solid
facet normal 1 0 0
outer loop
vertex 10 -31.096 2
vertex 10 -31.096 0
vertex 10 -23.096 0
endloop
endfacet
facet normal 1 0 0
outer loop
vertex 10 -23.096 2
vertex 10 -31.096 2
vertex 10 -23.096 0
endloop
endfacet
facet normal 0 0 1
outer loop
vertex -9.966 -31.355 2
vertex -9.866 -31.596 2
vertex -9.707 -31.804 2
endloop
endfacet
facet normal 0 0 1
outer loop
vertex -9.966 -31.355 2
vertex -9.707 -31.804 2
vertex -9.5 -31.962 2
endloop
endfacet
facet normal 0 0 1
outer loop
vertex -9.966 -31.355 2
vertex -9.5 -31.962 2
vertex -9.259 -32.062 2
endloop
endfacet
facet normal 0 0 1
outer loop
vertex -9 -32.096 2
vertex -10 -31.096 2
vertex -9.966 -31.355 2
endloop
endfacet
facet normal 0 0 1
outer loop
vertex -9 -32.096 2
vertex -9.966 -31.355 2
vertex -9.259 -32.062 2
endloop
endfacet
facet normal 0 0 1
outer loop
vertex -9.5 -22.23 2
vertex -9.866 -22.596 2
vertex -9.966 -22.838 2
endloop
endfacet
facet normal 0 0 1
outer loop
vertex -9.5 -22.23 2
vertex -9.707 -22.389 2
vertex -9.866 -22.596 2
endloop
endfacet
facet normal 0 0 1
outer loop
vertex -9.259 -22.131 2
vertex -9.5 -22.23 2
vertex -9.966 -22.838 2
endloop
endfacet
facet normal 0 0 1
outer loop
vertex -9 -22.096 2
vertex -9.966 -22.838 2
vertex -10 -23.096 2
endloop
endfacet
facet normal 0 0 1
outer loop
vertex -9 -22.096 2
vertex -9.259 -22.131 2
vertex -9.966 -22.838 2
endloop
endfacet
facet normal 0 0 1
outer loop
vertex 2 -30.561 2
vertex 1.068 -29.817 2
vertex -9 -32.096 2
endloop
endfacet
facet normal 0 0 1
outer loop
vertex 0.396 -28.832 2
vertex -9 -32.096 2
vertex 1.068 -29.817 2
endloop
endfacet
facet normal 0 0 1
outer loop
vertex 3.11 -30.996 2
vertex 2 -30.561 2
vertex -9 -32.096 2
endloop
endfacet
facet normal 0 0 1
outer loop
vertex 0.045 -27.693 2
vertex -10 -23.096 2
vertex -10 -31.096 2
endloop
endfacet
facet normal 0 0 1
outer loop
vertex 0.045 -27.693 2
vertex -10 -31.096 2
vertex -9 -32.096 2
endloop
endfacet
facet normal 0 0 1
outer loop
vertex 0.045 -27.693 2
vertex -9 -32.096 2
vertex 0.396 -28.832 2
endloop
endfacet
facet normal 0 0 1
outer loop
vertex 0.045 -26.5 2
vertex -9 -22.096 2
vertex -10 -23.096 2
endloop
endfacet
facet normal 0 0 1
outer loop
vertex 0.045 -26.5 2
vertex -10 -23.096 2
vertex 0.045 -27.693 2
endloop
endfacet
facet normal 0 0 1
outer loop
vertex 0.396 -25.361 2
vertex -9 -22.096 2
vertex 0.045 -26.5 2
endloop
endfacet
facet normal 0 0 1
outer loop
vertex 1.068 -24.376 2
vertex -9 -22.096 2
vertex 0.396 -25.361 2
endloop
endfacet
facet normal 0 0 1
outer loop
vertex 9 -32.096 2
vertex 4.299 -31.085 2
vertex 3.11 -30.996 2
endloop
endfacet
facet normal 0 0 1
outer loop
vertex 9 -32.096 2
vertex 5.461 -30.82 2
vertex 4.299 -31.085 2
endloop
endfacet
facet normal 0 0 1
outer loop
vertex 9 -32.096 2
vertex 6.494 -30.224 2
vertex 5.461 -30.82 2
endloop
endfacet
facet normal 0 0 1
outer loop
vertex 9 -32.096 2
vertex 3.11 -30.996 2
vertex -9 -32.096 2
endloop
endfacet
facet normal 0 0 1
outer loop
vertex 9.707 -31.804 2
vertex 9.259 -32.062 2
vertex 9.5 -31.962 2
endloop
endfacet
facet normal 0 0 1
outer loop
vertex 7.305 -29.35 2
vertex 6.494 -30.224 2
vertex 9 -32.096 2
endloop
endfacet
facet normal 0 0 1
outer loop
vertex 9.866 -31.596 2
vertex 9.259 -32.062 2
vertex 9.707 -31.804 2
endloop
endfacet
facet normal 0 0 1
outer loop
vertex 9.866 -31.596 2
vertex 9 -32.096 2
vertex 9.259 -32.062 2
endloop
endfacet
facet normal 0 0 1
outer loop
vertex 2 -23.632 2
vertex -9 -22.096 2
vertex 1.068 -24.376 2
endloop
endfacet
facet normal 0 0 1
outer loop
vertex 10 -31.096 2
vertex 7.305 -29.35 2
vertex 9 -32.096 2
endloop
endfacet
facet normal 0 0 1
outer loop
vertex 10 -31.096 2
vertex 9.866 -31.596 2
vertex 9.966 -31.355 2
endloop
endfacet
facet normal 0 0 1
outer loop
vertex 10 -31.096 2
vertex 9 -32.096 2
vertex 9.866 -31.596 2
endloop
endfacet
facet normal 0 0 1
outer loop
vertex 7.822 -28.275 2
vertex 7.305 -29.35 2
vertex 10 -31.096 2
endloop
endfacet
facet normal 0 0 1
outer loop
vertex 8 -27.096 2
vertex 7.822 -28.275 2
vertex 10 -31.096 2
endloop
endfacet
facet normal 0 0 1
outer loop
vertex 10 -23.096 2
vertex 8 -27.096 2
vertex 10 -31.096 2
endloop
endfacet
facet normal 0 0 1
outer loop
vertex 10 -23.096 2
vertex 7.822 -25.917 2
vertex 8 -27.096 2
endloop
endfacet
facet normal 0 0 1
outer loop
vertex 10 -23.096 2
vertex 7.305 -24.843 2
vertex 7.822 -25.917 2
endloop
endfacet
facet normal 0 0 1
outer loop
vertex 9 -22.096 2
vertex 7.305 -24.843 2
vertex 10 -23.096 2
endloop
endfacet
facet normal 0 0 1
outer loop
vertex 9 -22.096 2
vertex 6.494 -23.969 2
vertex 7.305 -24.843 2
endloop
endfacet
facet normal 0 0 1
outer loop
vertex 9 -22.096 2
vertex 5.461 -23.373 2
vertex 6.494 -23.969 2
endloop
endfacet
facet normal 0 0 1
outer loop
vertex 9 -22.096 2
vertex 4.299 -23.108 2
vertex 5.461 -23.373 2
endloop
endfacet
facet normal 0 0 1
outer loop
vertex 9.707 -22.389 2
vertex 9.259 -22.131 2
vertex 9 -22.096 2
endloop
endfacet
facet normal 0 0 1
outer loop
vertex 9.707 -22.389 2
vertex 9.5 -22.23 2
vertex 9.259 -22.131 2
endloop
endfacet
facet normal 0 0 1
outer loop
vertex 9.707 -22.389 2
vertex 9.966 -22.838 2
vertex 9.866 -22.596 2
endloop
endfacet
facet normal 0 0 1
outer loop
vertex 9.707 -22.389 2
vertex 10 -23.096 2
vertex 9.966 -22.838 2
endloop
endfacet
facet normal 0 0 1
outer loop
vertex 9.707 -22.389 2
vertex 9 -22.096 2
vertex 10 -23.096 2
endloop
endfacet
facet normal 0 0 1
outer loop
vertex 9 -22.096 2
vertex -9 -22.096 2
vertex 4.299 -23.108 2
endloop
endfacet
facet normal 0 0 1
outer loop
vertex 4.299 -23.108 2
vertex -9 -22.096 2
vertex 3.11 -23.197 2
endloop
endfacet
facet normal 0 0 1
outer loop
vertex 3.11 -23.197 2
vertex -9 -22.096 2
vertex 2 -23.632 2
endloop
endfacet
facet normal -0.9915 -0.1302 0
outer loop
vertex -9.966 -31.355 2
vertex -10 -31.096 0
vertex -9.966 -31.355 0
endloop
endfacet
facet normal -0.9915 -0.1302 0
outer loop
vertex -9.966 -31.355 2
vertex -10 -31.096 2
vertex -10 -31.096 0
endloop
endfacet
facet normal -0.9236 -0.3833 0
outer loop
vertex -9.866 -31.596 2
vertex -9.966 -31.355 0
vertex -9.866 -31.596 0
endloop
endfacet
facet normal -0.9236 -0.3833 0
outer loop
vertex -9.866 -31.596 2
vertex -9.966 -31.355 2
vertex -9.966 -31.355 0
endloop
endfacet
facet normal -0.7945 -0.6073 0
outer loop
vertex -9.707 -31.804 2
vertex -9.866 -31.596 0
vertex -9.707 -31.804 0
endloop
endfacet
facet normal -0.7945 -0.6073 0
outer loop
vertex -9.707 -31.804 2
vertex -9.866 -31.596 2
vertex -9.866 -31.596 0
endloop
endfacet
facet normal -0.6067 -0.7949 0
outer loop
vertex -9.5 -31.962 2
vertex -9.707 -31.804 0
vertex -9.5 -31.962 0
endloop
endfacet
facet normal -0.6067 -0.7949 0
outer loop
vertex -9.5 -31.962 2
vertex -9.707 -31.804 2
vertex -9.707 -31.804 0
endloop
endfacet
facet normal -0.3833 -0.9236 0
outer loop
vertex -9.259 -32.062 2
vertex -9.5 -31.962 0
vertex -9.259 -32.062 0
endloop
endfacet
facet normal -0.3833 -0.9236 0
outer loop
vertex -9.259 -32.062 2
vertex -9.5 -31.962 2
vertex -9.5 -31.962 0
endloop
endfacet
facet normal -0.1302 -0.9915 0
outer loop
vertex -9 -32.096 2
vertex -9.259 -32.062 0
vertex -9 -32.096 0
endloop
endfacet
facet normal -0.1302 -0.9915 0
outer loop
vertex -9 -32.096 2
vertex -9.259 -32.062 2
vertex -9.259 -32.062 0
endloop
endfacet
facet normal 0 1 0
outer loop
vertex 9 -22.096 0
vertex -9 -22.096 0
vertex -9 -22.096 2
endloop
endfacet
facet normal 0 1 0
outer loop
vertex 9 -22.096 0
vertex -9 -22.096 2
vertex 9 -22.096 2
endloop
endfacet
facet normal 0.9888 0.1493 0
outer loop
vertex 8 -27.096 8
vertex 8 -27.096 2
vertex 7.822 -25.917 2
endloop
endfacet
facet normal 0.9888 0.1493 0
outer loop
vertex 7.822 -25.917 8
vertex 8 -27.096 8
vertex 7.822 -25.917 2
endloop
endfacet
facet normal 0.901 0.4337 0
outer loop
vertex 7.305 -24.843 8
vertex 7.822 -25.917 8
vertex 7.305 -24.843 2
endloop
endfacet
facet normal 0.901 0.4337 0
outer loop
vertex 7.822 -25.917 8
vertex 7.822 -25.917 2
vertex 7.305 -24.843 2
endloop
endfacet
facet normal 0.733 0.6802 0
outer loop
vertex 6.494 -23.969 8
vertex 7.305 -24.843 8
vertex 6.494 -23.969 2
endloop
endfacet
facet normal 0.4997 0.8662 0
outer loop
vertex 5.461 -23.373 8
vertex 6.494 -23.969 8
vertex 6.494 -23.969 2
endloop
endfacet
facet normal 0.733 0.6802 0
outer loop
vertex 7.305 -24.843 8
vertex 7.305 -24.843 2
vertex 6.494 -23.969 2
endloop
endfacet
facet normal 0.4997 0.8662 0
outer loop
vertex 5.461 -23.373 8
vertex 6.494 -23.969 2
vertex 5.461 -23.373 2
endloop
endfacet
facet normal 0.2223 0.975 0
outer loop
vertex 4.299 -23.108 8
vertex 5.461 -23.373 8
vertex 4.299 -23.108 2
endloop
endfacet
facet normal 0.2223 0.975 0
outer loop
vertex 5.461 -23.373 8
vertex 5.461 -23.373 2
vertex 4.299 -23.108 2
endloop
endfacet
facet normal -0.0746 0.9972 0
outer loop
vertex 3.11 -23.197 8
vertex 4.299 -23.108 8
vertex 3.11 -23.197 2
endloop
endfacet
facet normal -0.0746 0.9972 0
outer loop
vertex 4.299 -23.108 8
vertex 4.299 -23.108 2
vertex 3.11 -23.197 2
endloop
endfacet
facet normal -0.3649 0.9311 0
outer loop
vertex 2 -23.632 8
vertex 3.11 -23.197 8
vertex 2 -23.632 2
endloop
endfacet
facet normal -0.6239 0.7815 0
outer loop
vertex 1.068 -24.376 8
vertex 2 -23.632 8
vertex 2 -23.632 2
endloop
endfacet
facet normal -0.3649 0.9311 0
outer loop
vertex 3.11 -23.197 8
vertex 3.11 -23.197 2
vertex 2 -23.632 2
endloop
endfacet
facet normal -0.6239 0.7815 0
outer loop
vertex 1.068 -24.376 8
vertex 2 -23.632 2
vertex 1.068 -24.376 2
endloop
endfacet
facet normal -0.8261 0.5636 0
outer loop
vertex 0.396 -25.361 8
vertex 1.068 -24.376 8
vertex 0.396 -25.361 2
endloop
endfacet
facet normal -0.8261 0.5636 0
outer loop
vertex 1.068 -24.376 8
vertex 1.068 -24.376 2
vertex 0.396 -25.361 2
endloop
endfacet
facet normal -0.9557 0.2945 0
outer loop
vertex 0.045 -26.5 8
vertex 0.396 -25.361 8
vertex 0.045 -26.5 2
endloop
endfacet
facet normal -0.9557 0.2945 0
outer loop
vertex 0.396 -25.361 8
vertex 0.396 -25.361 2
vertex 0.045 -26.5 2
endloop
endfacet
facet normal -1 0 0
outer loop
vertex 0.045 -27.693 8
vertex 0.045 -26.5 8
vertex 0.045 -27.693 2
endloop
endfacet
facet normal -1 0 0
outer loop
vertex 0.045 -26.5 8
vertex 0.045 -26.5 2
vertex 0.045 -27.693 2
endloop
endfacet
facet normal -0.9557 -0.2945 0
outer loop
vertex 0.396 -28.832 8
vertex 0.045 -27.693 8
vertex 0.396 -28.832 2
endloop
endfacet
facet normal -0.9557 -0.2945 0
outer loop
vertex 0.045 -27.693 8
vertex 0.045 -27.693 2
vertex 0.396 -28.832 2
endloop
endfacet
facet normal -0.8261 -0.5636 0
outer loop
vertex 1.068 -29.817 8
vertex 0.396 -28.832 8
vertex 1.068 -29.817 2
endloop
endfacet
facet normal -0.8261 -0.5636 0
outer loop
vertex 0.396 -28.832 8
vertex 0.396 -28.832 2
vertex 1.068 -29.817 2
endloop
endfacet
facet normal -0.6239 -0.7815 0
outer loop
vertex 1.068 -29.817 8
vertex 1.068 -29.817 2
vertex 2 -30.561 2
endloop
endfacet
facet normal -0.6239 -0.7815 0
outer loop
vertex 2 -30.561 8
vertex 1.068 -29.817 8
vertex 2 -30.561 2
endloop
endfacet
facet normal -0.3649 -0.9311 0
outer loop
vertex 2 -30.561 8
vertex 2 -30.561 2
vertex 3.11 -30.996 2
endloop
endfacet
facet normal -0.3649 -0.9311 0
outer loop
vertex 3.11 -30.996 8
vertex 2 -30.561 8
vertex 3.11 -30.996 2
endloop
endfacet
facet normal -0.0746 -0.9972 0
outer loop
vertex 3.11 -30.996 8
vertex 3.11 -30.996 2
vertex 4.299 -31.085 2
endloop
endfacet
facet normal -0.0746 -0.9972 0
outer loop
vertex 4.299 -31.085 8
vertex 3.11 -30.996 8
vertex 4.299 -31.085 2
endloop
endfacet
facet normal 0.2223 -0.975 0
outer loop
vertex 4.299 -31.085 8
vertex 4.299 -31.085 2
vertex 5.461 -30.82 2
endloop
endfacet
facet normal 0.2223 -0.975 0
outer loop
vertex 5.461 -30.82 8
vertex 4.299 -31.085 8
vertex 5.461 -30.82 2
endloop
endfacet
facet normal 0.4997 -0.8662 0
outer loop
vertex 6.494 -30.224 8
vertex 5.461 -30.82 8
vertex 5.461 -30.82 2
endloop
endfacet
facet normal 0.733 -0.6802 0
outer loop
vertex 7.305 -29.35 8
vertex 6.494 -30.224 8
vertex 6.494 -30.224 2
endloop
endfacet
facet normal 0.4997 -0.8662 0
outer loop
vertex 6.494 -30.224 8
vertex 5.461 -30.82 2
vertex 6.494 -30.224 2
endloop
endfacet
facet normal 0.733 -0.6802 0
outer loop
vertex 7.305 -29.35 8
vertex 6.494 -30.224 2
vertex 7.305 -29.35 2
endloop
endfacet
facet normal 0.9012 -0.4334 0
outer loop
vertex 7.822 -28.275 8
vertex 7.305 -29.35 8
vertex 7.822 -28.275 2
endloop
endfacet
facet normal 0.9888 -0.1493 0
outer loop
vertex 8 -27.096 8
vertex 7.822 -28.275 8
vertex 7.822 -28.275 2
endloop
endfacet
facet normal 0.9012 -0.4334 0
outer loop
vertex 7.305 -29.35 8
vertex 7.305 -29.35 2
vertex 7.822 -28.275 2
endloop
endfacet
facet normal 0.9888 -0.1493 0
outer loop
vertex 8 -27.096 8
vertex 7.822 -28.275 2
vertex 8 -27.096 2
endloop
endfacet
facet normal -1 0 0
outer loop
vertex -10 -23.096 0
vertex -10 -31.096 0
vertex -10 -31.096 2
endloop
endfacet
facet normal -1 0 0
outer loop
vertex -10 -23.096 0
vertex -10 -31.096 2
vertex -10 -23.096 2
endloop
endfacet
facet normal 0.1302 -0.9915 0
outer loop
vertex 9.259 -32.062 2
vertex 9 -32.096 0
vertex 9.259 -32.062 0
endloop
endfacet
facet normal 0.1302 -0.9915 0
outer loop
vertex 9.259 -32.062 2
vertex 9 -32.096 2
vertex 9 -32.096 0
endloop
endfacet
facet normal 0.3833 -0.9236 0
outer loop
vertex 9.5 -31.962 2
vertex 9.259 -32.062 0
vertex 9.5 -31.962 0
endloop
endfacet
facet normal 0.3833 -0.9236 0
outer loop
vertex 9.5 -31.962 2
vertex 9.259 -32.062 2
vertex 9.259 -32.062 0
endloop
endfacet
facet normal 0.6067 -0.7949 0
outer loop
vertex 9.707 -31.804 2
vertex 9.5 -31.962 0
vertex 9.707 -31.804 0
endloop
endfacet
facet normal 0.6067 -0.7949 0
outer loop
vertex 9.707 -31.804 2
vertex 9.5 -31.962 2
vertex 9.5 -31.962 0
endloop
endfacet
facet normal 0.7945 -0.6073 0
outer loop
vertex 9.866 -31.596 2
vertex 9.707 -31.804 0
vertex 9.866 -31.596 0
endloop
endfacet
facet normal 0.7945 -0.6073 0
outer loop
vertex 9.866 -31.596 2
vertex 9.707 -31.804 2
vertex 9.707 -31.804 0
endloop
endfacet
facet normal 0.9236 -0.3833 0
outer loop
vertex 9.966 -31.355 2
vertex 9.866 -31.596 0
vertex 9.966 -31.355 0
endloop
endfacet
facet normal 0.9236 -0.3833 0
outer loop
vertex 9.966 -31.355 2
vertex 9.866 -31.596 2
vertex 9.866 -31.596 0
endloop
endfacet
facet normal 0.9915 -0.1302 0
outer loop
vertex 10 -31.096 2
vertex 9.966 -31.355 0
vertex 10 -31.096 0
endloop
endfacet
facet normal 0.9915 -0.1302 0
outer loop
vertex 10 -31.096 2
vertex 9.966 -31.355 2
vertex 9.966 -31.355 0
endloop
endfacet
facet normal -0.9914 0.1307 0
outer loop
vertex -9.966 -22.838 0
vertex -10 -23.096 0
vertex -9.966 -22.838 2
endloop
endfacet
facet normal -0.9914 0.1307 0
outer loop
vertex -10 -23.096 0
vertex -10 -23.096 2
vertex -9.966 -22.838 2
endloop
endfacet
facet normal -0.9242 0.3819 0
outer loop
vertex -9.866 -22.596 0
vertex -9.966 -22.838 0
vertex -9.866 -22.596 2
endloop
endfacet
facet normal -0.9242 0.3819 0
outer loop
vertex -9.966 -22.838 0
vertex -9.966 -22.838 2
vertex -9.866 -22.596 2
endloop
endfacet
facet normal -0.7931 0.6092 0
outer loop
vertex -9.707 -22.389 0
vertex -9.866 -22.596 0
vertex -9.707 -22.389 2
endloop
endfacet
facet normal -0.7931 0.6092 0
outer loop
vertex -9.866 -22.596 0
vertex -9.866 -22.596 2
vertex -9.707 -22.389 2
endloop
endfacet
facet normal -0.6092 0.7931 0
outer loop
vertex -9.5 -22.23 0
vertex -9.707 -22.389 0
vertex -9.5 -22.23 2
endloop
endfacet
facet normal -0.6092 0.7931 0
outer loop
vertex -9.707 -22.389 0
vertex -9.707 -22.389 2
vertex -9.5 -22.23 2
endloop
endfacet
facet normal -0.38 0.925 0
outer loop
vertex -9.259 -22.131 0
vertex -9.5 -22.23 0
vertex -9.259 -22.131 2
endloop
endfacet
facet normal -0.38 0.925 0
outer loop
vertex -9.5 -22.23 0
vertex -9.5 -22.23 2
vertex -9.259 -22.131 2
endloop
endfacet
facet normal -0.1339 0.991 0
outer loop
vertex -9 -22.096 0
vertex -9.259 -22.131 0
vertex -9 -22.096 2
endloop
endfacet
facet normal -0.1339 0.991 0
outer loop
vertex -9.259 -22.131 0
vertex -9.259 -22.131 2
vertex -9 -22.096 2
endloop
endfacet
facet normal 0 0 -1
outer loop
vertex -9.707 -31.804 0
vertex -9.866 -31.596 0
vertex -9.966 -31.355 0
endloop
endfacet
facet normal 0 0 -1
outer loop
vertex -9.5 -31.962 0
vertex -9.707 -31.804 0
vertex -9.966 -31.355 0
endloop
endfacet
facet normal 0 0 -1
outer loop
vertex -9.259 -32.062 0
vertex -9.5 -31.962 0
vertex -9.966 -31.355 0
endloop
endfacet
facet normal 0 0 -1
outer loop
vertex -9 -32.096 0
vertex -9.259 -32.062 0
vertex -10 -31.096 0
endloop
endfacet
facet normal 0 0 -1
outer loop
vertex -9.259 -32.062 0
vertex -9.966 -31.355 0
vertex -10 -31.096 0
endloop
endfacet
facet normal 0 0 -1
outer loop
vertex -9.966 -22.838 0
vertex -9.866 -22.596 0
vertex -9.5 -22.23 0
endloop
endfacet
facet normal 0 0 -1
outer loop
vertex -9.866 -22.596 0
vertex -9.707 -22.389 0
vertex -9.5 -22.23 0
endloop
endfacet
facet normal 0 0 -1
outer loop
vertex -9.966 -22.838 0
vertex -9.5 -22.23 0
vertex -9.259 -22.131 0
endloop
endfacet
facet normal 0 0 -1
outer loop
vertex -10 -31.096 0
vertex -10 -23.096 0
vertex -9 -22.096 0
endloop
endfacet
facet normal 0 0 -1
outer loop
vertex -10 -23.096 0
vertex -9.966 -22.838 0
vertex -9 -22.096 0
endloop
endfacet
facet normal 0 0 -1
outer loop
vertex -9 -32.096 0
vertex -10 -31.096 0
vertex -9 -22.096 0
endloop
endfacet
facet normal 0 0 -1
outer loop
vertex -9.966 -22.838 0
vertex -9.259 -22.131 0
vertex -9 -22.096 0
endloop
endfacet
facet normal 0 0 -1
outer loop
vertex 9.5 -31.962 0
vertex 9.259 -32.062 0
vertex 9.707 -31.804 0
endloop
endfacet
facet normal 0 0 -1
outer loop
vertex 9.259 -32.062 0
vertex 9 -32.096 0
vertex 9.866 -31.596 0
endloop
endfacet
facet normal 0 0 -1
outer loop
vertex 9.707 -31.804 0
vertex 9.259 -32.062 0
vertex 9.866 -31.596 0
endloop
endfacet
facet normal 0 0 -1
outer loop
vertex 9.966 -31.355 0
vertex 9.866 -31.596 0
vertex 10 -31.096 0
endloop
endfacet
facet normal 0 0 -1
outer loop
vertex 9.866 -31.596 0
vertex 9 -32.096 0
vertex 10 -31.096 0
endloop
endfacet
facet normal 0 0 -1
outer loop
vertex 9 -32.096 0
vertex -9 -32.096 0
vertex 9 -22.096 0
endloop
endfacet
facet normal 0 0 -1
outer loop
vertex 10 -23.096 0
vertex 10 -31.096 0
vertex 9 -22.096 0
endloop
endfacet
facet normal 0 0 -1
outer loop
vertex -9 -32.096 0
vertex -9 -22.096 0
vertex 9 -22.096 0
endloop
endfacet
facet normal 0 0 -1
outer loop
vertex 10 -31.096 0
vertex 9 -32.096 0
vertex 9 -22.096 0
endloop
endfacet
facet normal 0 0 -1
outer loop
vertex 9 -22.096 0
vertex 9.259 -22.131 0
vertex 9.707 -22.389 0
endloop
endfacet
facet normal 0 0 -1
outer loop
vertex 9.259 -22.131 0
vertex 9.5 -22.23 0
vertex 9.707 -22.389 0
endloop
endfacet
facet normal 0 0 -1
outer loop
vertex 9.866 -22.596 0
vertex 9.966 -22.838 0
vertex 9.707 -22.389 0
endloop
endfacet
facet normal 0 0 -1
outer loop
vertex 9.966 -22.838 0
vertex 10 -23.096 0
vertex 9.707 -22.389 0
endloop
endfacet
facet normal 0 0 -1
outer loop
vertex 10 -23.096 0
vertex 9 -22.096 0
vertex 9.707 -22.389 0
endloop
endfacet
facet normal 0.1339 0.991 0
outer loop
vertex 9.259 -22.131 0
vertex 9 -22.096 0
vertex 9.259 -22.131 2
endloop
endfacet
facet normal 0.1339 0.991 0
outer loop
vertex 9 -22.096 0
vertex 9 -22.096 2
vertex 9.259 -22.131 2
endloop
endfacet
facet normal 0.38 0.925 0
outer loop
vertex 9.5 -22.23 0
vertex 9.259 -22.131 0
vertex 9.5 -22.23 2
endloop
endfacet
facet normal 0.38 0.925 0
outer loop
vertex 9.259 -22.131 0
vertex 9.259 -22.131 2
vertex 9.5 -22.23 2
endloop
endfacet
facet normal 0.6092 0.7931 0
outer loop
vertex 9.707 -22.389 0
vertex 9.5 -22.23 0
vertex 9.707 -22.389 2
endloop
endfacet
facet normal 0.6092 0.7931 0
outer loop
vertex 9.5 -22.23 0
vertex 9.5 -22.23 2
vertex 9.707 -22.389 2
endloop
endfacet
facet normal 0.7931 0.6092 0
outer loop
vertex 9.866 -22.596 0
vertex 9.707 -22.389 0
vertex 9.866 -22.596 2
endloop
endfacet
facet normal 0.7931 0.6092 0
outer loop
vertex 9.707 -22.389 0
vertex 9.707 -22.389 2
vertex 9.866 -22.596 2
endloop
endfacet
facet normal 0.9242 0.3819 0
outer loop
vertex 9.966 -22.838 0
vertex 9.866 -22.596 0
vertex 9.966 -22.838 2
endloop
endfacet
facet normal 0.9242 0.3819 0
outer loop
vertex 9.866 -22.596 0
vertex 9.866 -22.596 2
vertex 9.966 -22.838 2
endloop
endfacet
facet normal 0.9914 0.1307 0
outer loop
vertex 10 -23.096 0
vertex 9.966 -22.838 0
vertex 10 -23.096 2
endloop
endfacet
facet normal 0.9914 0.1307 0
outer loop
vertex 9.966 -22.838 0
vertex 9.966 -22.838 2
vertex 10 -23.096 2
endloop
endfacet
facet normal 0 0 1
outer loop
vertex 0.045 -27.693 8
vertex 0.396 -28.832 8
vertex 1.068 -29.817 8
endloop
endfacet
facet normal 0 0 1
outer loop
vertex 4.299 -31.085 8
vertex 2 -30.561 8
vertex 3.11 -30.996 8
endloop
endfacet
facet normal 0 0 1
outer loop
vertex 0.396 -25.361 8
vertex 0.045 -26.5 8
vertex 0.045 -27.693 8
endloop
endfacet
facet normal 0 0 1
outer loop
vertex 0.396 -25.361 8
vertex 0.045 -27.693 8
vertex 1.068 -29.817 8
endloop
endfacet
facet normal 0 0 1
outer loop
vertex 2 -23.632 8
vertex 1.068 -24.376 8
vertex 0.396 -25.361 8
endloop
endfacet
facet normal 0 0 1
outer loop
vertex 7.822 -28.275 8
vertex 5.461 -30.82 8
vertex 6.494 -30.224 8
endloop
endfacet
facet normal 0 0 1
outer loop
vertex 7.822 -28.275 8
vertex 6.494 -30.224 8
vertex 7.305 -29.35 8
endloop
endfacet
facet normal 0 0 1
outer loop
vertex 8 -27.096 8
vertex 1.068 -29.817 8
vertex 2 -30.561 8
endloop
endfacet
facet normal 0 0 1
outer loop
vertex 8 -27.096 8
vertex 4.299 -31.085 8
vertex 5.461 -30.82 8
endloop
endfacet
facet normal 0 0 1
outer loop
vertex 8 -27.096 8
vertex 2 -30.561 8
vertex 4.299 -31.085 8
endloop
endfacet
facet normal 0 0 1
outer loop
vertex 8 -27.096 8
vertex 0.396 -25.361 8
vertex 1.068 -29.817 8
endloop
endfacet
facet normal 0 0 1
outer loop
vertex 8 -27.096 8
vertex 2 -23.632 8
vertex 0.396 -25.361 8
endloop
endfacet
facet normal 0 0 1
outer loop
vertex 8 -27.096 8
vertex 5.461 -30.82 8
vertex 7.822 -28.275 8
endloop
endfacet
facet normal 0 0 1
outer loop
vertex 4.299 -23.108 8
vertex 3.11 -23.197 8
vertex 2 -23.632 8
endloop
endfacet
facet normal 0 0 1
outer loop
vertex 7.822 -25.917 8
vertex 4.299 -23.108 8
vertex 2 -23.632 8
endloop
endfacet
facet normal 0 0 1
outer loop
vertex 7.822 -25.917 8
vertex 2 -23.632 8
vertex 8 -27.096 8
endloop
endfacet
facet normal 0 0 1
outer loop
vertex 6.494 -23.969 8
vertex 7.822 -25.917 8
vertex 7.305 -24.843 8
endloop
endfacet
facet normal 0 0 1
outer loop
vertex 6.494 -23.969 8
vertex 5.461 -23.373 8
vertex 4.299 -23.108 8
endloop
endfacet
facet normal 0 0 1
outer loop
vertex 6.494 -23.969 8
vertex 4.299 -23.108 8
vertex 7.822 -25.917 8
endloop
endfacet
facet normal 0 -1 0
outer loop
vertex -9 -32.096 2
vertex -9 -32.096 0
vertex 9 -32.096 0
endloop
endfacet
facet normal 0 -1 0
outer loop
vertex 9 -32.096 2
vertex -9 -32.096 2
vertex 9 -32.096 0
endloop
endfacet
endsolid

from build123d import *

# Parameters (mm, degrees)
SKETCH1_W           = 20
SKETCH1_H           = 10
BOSS_EXTRUDE1_DEPTH = 2
SKETCH2_R           = 4
BOSS_EXTRUDE2_DEPTH = 6
FILLET1_R           = 1


with BuildPart() as part:
    # Sketch1 → Boss-Extrude1 (new body)
    with BuildSketch(Plane.XY):
        with Locations((0, -27.096458497)):
            Rectangle(SKETCH1_W, SKETCH1_H)
    extrude(amount=BOSS_EXTRUDE1_DEPTH)

    # Sketch2 → Boss-Extrude2 (add)
    with BuildSketch(Plane.XY.offset(2)):
        with Locations((4, -27.096458497)):
            Circle(SKETCH2_R)
    extrude(amount=BOSS_EXTRUDE2_DEPTH)

    # Fillet1
    fillet1_edges = [part.edges().sort_by_distance(p)[0] for p in [
        (-10, -22.096458497, 1),
        (10, -22.096458497, 1),
        (10, -32.096458497, 1),
        (-10, -32.096458497, 1),
    ]]
    fillet(fillet1_edges, radius=FILLET1_R)


solid = part.part
